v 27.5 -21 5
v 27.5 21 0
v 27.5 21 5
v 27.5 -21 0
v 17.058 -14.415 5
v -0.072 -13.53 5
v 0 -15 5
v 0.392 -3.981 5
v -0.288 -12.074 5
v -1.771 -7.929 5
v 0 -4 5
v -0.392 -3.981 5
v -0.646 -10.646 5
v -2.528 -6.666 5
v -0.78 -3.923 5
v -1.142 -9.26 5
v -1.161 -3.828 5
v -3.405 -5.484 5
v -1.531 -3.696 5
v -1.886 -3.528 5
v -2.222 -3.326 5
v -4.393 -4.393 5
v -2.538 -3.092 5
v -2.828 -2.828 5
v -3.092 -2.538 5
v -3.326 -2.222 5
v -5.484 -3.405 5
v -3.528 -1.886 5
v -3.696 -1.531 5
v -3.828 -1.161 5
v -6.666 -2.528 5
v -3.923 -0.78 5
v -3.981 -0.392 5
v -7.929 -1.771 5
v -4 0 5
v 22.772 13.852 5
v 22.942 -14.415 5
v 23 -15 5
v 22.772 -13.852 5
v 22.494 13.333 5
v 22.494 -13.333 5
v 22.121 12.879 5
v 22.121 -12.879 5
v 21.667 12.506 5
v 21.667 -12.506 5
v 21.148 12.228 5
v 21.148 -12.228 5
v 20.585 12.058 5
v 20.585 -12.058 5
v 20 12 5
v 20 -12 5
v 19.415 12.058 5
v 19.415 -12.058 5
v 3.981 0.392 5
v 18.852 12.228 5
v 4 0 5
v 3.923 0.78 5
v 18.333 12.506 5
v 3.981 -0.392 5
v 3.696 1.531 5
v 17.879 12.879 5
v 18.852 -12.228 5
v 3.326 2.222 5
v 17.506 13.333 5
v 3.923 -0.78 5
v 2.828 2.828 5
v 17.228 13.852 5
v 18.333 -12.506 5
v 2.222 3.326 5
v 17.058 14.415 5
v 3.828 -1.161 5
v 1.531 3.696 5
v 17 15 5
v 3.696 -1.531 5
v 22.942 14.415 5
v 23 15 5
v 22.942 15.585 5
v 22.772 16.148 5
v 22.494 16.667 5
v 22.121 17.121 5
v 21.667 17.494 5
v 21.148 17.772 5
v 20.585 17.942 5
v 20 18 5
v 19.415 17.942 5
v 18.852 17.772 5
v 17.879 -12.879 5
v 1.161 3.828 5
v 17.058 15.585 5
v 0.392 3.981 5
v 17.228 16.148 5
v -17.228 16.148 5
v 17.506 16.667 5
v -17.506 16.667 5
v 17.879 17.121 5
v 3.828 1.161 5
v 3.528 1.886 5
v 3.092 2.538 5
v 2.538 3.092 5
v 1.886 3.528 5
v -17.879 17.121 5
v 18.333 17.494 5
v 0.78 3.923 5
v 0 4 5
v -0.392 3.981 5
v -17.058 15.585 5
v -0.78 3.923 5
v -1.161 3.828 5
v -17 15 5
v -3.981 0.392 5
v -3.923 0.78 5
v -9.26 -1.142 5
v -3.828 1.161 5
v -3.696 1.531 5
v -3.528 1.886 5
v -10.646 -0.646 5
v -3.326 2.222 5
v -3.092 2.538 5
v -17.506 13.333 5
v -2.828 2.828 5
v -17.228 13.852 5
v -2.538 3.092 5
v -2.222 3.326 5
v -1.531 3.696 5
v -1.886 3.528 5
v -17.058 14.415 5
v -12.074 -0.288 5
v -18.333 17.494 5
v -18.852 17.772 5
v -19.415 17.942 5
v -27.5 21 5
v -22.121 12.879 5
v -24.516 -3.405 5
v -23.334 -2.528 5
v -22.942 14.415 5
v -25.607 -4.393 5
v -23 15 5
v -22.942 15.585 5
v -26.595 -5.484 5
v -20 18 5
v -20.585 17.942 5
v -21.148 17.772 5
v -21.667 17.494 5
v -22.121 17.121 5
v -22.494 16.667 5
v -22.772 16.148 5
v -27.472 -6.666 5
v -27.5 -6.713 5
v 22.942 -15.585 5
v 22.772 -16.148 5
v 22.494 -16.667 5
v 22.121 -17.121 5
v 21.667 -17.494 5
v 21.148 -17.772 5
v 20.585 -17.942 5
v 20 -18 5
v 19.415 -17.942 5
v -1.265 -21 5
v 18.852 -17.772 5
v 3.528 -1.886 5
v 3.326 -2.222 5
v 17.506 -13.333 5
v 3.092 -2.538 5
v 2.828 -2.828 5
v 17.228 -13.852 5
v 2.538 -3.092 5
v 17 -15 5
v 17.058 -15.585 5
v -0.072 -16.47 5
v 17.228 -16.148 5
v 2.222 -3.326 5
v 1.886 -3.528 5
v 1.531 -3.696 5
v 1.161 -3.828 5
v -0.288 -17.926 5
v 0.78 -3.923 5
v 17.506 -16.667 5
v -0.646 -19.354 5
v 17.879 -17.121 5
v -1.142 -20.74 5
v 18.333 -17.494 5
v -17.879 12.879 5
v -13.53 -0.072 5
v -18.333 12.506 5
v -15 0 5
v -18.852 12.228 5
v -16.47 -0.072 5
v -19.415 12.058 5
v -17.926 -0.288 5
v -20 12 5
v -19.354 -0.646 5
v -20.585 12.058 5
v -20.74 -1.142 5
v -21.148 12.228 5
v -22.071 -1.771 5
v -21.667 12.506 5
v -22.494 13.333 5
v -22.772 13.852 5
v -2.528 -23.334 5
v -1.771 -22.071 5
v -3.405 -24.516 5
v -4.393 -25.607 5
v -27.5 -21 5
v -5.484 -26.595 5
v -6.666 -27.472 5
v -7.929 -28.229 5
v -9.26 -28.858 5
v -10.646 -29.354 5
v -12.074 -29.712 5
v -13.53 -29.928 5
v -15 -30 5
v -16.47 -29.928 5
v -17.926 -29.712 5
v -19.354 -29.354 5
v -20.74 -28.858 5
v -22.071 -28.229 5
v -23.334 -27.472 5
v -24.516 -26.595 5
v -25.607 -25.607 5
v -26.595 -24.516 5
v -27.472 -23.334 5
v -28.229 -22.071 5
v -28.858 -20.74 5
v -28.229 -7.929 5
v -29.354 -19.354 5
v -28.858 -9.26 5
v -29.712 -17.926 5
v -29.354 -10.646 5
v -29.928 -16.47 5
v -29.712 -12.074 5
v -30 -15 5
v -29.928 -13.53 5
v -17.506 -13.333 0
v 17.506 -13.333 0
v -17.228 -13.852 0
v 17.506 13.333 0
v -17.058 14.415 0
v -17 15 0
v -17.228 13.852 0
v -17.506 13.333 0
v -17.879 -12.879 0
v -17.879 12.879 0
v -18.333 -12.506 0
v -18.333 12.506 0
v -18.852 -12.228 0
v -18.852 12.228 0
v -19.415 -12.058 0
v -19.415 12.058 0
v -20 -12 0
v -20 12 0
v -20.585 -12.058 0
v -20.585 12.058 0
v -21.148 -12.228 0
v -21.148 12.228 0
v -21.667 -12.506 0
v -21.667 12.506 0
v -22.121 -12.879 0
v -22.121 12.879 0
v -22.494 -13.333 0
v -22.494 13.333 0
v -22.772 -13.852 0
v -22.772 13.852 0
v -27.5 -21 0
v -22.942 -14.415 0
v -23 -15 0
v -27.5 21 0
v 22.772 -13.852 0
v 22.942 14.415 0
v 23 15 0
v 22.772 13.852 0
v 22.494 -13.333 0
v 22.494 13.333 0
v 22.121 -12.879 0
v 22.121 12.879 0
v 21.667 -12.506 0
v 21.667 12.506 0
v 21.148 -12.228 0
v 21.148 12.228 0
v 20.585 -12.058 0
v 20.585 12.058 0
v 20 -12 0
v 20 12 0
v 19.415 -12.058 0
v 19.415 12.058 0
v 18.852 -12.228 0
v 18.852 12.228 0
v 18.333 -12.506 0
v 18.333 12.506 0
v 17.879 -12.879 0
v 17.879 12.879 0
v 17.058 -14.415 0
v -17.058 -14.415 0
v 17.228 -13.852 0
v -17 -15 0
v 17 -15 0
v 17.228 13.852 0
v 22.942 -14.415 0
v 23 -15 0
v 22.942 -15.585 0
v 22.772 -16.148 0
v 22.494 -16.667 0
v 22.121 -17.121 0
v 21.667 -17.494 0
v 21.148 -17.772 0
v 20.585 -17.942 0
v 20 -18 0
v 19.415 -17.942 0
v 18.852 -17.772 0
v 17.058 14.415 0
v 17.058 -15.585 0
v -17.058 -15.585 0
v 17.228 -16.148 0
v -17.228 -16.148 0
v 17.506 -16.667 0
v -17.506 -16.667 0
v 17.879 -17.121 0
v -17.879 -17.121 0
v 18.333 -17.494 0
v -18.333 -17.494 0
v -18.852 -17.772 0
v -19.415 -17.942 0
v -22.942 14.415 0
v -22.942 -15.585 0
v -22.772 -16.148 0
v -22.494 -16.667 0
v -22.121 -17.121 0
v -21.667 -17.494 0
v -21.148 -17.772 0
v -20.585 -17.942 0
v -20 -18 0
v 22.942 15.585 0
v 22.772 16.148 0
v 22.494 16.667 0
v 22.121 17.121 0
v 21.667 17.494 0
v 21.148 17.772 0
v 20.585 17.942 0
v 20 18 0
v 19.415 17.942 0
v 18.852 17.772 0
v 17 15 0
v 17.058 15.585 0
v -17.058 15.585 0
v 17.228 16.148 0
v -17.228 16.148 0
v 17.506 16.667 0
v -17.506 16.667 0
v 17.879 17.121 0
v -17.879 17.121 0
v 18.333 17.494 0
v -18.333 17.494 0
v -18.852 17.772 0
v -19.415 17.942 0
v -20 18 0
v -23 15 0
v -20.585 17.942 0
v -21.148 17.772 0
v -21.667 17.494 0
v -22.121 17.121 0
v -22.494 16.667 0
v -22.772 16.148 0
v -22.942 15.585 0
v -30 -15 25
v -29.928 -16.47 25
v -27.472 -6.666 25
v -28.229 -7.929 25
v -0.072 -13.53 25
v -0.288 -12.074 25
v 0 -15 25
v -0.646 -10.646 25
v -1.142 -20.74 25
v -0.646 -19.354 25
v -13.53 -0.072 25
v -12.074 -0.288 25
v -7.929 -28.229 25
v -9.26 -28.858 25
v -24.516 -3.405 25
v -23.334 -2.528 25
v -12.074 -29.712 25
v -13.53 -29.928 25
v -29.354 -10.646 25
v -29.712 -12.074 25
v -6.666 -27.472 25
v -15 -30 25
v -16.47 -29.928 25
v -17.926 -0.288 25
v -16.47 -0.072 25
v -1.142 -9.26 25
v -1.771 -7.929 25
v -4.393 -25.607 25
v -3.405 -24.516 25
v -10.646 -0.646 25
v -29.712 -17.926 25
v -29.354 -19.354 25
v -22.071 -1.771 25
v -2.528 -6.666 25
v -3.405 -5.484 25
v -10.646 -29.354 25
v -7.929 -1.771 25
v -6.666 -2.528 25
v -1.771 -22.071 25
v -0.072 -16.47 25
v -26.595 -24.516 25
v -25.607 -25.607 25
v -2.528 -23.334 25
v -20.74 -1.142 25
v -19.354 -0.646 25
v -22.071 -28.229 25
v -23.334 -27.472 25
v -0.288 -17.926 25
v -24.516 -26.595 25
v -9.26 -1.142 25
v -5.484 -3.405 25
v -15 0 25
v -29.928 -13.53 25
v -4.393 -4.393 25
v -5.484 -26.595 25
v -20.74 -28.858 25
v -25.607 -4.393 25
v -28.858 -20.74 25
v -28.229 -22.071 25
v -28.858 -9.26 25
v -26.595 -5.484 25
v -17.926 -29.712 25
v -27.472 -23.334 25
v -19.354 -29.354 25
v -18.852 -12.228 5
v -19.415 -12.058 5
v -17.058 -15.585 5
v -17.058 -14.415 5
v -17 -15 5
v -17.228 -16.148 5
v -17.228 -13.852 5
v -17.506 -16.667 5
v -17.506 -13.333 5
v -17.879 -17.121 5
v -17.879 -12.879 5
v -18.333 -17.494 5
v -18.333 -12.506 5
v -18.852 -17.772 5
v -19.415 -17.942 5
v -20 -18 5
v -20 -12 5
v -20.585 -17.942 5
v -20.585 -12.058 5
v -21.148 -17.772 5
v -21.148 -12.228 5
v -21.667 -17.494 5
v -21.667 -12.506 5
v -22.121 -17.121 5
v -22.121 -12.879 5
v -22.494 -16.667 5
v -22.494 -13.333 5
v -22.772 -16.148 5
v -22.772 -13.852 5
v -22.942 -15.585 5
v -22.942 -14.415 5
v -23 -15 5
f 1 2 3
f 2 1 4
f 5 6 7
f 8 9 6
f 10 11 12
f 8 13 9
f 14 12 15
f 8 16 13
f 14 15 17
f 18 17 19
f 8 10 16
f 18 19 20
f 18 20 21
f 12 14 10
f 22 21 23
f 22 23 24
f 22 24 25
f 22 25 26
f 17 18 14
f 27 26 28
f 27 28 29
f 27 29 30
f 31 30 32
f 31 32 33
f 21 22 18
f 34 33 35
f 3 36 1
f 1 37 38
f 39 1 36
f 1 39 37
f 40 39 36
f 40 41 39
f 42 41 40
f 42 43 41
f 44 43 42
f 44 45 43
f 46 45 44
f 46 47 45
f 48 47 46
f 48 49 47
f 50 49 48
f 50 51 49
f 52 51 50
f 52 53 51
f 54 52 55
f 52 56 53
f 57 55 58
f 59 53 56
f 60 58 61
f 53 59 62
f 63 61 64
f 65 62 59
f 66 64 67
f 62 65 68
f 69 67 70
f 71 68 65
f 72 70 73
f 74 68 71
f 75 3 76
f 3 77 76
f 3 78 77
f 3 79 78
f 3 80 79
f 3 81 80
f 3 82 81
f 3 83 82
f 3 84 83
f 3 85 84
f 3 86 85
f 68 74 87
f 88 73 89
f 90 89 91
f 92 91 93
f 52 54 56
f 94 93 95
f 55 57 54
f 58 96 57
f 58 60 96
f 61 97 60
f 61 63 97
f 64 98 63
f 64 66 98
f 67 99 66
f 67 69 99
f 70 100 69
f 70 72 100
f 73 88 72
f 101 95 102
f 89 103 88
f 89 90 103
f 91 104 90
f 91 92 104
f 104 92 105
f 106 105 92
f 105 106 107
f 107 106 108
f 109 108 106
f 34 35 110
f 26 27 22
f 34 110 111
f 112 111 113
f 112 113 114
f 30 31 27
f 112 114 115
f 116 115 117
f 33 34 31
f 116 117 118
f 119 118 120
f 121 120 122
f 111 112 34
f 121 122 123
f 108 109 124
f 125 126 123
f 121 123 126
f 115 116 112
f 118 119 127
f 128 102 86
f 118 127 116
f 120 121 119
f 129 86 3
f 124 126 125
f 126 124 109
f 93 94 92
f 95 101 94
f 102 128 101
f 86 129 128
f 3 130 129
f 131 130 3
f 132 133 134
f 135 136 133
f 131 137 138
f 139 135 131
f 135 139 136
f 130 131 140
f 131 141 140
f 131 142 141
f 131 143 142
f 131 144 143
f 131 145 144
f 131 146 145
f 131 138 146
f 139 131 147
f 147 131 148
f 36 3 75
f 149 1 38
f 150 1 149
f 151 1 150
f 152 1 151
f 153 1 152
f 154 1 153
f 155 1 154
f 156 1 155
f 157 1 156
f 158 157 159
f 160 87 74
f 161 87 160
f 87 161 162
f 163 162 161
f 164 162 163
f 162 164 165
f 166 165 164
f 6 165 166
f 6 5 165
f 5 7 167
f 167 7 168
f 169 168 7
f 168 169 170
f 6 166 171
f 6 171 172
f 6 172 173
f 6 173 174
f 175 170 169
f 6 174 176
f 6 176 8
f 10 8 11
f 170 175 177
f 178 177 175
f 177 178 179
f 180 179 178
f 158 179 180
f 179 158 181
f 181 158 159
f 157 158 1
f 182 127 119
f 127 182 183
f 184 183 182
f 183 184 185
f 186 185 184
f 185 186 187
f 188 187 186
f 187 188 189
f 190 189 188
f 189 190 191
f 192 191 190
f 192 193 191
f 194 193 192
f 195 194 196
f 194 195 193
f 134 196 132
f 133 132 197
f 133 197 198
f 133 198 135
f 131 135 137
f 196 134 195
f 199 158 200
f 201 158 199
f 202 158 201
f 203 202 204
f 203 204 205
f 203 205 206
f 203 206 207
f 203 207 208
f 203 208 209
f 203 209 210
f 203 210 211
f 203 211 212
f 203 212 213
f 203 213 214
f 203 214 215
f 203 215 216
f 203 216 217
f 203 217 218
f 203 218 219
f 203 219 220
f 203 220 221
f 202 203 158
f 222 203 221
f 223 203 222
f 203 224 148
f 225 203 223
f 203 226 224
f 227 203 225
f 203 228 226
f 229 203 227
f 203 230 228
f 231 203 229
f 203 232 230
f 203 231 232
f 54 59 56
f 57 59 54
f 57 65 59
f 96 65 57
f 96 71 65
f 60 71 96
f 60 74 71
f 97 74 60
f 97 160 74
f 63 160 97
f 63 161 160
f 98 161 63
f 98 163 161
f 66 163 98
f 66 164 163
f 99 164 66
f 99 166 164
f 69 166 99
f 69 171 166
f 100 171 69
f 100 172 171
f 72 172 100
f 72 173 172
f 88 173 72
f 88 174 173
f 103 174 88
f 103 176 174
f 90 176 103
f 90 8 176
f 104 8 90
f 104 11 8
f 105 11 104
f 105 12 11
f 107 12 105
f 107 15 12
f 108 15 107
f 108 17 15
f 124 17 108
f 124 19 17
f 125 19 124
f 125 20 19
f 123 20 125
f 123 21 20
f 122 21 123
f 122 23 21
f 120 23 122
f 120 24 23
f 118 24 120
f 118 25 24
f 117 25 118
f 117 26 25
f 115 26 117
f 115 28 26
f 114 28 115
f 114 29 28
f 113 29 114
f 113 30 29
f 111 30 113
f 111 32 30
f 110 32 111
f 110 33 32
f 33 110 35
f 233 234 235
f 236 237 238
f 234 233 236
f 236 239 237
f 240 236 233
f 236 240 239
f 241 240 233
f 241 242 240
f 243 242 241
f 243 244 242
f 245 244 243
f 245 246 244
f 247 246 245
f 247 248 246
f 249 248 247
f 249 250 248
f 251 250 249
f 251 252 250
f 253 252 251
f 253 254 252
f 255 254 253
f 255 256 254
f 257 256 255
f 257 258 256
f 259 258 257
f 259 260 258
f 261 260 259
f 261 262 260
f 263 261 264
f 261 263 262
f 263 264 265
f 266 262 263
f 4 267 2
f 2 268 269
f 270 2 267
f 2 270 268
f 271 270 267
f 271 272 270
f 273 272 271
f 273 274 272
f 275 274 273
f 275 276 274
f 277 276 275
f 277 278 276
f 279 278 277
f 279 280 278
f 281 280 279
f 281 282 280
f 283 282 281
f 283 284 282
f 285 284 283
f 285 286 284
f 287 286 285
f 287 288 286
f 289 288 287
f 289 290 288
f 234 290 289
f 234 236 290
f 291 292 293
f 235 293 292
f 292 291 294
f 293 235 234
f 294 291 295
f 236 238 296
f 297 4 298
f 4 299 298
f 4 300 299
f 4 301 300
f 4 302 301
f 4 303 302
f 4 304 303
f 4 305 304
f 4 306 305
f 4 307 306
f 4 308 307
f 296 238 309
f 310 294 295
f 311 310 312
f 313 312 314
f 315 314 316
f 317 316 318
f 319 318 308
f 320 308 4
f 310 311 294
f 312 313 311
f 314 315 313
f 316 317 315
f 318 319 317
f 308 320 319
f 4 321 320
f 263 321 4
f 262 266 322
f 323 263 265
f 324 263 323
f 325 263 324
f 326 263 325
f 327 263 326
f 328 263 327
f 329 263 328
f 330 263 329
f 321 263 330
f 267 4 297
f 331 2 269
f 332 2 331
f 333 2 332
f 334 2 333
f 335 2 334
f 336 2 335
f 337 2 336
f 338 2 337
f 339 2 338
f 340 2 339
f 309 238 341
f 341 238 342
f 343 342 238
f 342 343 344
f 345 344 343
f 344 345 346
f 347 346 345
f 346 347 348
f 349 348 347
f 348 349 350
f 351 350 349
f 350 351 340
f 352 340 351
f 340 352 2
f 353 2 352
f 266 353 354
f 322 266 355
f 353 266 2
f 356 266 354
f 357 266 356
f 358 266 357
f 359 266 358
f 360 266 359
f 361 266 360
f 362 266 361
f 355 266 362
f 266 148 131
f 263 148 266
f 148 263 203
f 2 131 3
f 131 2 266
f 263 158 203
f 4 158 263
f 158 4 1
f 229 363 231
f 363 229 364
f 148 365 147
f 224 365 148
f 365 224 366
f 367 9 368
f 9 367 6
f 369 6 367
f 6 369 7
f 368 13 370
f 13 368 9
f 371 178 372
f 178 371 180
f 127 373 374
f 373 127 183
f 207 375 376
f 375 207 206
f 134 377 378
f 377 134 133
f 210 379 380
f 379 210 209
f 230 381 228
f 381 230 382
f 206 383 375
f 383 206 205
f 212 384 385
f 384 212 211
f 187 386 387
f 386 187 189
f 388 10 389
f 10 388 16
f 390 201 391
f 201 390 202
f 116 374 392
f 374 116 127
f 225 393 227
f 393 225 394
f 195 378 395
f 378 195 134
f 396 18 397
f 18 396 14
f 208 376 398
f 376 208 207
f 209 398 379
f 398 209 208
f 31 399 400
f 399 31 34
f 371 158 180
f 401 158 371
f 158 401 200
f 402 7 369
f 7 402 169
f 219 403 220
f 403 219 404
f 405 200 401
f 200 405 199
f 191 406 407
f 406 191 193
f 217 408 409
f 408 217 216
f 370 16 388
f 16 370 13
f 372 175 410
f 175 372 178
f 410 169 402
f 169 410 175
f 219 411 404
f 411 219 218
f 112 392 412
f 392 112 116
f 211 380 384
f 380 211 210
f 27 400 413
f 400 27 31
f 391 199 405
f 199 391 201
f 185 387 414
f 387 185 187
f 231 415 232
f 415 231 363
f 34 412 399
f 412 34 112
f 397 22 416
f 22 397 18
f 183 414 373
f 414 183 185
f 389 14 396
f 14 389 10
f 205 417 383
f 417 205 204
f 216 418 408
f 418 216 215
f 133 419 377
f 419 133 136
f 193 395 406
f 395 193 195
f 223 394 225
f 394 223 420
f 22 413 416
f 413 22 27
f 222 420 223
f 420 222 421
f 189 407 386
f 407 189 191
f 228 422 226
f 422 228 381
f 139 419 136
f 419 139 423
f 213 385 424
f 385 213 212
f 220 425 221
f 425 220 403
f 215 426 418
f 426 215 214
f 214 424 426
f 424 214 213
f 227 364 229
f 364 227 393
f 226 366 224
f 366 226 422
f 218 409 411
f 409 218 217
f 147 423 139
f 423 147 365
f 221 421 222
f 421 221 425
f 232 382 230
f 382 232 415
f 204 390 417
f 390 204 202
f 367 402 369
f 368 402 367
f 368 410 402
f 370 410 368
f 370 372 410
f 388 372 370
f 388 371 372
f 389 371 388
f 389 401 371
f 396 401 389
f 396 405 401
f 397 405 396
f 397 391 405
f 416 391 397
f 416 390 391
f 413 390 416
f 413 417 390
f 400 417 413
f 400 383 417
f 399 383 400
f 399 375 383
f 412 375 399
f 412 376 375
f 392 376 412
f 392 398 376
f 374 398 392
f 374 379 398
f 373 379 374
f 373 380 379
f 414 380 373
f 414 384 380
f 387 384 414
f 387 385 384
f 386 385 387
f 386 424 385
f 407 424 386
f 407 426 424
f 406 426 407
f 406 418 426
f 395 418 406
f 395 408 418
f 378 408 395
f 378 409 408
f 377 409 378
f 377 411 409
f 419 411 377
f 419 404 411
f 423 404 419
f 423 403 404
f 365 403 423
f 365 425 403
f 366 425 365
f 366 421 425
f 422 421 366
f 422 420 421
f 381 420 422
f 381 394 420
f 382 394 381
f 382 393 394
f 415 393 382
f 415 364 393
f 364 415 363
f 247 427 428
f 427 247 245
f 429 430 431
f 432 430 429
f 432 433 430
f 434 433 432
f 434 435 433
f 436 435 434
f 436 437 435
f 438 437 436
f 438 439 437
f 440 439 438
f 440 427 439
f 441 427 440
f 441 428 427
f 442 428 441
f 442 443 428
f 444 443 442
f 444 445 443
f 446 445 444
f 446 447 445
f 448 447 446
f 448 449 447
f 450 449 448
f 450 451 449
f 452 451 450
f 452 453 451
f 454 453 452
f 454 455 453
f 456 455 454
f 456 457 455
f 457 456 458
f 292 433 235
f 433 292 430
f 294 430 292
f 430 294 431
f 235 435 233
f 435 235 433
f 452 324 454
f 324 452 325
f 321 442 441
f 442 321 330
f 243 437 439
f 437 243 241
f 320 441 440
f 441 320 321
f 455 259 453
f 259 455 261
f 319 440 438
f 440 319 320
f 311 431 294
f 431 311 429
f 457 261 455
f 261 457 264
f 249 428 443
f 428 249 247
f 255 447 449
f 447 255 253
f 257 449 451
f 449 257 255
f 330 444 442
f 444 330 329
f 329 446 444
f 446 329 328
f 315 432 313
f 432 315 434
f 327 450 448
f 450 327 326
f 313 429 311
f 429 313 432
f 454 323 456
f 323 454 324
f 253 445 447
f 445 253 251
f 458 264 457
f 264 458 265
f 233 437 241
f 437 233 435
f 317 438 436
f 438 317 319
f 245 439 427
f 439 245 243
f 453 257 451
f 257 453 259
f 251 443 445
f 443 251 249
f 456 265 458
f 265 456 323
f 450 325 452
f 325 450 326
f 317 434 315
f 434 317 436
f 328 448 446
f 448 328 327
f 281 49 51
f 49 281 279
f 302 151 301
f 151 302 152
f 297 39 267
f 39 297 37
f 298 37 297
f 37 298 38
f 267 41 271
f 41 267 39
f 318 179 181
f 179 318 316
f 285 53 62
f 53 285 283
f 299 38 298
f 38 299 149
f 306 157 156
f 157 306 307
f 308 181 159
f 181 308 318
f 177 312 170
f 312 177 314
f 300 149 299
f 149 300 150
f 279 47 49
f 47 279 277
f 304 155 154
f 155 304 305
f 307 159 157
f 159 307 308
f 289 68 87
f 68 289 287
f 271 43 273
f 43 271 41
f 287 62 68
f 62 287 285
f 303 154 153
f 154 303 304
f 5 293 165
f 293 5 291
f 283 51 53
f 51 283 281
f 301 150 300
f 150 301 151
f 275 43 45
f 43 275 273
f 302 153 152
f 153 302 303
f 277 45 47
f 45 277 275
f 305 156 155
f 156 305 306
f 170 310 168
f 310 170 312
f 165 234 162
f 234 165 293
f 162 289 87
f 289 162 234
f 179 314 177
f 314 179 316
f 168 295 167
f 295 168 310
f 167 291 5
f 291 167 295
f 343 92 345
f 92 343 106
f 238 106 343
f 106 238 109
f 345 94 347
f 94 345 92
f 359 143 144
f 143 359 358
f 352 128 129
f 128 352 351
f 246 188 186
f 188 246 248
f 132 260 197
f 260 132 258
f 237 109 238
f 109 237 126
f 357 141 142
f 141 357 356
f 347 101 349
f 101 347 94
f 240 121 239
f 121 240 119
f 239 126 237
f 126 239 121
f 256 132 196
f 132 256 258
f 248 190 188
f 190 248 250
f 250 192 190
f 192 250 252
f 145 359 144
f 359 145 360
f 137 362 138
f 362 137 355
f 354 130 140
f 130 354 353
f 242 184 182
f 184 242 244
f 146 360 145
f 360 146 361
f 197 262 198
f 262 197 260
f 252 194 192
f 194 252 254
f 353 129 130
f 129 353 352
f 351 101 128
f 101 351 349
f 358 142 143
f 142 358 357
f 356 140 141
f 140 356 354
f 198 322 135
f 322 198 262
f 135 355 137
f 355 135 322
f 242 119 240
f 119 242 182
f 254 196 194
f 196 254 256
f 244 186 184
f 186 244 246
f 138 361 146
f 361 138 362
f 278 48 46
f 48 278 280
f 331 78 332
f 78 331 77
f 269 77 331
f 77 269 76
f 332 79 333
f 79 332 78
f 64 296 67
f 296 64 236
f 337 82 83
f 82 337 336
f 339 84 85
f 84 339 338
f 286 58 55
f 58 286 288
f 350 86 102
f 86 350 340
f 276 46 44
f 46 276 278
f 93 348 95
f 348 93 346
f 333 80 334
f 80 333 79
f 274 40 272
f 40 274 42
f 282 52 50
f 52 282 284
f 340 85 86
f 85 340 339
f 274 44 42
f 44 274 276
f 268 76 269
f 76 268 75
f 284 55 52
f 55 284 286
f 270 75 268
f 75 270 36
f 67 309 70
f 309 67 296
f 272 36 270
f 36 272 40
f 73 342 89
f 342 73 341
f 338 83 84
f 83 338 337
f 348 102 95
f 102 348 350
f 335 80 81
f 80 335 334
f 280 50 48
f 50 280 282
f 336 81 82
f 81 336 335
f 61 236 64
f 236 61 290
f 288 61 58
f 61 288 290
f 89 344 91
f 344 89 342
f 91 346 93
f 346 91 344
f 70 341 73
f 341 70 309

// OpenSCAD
module pillow_block_bearing() {
    difference() {
        union() {
            // Base
            translate([-27.5, -21, 0])
                cube([55, 42, 5]);
            
            // Bearing holder
            translate([-15, -15, 5])
                cylinder(h=20, r=15, $fn=64);
        }
        
        // Shaft hole
        translate([0, 0, 5])
            cylinder(h=20, r=4, $fn=64);
        
        // Mounting holes
        translate([-20, -15, 0])
            cylinder(h=5, r=3, $fn=32);
        translate([20, -15, 0])
            cylinder(h=5, r=3, $fn=32);
        translate([-20, 15, 0])
            cylinder(h=5, r=3, $fn=32);
        translate([20, 15, 0])
            cylinder(h=5, r=3, $fn=32);
    }
}

pillow_block_bearing();
